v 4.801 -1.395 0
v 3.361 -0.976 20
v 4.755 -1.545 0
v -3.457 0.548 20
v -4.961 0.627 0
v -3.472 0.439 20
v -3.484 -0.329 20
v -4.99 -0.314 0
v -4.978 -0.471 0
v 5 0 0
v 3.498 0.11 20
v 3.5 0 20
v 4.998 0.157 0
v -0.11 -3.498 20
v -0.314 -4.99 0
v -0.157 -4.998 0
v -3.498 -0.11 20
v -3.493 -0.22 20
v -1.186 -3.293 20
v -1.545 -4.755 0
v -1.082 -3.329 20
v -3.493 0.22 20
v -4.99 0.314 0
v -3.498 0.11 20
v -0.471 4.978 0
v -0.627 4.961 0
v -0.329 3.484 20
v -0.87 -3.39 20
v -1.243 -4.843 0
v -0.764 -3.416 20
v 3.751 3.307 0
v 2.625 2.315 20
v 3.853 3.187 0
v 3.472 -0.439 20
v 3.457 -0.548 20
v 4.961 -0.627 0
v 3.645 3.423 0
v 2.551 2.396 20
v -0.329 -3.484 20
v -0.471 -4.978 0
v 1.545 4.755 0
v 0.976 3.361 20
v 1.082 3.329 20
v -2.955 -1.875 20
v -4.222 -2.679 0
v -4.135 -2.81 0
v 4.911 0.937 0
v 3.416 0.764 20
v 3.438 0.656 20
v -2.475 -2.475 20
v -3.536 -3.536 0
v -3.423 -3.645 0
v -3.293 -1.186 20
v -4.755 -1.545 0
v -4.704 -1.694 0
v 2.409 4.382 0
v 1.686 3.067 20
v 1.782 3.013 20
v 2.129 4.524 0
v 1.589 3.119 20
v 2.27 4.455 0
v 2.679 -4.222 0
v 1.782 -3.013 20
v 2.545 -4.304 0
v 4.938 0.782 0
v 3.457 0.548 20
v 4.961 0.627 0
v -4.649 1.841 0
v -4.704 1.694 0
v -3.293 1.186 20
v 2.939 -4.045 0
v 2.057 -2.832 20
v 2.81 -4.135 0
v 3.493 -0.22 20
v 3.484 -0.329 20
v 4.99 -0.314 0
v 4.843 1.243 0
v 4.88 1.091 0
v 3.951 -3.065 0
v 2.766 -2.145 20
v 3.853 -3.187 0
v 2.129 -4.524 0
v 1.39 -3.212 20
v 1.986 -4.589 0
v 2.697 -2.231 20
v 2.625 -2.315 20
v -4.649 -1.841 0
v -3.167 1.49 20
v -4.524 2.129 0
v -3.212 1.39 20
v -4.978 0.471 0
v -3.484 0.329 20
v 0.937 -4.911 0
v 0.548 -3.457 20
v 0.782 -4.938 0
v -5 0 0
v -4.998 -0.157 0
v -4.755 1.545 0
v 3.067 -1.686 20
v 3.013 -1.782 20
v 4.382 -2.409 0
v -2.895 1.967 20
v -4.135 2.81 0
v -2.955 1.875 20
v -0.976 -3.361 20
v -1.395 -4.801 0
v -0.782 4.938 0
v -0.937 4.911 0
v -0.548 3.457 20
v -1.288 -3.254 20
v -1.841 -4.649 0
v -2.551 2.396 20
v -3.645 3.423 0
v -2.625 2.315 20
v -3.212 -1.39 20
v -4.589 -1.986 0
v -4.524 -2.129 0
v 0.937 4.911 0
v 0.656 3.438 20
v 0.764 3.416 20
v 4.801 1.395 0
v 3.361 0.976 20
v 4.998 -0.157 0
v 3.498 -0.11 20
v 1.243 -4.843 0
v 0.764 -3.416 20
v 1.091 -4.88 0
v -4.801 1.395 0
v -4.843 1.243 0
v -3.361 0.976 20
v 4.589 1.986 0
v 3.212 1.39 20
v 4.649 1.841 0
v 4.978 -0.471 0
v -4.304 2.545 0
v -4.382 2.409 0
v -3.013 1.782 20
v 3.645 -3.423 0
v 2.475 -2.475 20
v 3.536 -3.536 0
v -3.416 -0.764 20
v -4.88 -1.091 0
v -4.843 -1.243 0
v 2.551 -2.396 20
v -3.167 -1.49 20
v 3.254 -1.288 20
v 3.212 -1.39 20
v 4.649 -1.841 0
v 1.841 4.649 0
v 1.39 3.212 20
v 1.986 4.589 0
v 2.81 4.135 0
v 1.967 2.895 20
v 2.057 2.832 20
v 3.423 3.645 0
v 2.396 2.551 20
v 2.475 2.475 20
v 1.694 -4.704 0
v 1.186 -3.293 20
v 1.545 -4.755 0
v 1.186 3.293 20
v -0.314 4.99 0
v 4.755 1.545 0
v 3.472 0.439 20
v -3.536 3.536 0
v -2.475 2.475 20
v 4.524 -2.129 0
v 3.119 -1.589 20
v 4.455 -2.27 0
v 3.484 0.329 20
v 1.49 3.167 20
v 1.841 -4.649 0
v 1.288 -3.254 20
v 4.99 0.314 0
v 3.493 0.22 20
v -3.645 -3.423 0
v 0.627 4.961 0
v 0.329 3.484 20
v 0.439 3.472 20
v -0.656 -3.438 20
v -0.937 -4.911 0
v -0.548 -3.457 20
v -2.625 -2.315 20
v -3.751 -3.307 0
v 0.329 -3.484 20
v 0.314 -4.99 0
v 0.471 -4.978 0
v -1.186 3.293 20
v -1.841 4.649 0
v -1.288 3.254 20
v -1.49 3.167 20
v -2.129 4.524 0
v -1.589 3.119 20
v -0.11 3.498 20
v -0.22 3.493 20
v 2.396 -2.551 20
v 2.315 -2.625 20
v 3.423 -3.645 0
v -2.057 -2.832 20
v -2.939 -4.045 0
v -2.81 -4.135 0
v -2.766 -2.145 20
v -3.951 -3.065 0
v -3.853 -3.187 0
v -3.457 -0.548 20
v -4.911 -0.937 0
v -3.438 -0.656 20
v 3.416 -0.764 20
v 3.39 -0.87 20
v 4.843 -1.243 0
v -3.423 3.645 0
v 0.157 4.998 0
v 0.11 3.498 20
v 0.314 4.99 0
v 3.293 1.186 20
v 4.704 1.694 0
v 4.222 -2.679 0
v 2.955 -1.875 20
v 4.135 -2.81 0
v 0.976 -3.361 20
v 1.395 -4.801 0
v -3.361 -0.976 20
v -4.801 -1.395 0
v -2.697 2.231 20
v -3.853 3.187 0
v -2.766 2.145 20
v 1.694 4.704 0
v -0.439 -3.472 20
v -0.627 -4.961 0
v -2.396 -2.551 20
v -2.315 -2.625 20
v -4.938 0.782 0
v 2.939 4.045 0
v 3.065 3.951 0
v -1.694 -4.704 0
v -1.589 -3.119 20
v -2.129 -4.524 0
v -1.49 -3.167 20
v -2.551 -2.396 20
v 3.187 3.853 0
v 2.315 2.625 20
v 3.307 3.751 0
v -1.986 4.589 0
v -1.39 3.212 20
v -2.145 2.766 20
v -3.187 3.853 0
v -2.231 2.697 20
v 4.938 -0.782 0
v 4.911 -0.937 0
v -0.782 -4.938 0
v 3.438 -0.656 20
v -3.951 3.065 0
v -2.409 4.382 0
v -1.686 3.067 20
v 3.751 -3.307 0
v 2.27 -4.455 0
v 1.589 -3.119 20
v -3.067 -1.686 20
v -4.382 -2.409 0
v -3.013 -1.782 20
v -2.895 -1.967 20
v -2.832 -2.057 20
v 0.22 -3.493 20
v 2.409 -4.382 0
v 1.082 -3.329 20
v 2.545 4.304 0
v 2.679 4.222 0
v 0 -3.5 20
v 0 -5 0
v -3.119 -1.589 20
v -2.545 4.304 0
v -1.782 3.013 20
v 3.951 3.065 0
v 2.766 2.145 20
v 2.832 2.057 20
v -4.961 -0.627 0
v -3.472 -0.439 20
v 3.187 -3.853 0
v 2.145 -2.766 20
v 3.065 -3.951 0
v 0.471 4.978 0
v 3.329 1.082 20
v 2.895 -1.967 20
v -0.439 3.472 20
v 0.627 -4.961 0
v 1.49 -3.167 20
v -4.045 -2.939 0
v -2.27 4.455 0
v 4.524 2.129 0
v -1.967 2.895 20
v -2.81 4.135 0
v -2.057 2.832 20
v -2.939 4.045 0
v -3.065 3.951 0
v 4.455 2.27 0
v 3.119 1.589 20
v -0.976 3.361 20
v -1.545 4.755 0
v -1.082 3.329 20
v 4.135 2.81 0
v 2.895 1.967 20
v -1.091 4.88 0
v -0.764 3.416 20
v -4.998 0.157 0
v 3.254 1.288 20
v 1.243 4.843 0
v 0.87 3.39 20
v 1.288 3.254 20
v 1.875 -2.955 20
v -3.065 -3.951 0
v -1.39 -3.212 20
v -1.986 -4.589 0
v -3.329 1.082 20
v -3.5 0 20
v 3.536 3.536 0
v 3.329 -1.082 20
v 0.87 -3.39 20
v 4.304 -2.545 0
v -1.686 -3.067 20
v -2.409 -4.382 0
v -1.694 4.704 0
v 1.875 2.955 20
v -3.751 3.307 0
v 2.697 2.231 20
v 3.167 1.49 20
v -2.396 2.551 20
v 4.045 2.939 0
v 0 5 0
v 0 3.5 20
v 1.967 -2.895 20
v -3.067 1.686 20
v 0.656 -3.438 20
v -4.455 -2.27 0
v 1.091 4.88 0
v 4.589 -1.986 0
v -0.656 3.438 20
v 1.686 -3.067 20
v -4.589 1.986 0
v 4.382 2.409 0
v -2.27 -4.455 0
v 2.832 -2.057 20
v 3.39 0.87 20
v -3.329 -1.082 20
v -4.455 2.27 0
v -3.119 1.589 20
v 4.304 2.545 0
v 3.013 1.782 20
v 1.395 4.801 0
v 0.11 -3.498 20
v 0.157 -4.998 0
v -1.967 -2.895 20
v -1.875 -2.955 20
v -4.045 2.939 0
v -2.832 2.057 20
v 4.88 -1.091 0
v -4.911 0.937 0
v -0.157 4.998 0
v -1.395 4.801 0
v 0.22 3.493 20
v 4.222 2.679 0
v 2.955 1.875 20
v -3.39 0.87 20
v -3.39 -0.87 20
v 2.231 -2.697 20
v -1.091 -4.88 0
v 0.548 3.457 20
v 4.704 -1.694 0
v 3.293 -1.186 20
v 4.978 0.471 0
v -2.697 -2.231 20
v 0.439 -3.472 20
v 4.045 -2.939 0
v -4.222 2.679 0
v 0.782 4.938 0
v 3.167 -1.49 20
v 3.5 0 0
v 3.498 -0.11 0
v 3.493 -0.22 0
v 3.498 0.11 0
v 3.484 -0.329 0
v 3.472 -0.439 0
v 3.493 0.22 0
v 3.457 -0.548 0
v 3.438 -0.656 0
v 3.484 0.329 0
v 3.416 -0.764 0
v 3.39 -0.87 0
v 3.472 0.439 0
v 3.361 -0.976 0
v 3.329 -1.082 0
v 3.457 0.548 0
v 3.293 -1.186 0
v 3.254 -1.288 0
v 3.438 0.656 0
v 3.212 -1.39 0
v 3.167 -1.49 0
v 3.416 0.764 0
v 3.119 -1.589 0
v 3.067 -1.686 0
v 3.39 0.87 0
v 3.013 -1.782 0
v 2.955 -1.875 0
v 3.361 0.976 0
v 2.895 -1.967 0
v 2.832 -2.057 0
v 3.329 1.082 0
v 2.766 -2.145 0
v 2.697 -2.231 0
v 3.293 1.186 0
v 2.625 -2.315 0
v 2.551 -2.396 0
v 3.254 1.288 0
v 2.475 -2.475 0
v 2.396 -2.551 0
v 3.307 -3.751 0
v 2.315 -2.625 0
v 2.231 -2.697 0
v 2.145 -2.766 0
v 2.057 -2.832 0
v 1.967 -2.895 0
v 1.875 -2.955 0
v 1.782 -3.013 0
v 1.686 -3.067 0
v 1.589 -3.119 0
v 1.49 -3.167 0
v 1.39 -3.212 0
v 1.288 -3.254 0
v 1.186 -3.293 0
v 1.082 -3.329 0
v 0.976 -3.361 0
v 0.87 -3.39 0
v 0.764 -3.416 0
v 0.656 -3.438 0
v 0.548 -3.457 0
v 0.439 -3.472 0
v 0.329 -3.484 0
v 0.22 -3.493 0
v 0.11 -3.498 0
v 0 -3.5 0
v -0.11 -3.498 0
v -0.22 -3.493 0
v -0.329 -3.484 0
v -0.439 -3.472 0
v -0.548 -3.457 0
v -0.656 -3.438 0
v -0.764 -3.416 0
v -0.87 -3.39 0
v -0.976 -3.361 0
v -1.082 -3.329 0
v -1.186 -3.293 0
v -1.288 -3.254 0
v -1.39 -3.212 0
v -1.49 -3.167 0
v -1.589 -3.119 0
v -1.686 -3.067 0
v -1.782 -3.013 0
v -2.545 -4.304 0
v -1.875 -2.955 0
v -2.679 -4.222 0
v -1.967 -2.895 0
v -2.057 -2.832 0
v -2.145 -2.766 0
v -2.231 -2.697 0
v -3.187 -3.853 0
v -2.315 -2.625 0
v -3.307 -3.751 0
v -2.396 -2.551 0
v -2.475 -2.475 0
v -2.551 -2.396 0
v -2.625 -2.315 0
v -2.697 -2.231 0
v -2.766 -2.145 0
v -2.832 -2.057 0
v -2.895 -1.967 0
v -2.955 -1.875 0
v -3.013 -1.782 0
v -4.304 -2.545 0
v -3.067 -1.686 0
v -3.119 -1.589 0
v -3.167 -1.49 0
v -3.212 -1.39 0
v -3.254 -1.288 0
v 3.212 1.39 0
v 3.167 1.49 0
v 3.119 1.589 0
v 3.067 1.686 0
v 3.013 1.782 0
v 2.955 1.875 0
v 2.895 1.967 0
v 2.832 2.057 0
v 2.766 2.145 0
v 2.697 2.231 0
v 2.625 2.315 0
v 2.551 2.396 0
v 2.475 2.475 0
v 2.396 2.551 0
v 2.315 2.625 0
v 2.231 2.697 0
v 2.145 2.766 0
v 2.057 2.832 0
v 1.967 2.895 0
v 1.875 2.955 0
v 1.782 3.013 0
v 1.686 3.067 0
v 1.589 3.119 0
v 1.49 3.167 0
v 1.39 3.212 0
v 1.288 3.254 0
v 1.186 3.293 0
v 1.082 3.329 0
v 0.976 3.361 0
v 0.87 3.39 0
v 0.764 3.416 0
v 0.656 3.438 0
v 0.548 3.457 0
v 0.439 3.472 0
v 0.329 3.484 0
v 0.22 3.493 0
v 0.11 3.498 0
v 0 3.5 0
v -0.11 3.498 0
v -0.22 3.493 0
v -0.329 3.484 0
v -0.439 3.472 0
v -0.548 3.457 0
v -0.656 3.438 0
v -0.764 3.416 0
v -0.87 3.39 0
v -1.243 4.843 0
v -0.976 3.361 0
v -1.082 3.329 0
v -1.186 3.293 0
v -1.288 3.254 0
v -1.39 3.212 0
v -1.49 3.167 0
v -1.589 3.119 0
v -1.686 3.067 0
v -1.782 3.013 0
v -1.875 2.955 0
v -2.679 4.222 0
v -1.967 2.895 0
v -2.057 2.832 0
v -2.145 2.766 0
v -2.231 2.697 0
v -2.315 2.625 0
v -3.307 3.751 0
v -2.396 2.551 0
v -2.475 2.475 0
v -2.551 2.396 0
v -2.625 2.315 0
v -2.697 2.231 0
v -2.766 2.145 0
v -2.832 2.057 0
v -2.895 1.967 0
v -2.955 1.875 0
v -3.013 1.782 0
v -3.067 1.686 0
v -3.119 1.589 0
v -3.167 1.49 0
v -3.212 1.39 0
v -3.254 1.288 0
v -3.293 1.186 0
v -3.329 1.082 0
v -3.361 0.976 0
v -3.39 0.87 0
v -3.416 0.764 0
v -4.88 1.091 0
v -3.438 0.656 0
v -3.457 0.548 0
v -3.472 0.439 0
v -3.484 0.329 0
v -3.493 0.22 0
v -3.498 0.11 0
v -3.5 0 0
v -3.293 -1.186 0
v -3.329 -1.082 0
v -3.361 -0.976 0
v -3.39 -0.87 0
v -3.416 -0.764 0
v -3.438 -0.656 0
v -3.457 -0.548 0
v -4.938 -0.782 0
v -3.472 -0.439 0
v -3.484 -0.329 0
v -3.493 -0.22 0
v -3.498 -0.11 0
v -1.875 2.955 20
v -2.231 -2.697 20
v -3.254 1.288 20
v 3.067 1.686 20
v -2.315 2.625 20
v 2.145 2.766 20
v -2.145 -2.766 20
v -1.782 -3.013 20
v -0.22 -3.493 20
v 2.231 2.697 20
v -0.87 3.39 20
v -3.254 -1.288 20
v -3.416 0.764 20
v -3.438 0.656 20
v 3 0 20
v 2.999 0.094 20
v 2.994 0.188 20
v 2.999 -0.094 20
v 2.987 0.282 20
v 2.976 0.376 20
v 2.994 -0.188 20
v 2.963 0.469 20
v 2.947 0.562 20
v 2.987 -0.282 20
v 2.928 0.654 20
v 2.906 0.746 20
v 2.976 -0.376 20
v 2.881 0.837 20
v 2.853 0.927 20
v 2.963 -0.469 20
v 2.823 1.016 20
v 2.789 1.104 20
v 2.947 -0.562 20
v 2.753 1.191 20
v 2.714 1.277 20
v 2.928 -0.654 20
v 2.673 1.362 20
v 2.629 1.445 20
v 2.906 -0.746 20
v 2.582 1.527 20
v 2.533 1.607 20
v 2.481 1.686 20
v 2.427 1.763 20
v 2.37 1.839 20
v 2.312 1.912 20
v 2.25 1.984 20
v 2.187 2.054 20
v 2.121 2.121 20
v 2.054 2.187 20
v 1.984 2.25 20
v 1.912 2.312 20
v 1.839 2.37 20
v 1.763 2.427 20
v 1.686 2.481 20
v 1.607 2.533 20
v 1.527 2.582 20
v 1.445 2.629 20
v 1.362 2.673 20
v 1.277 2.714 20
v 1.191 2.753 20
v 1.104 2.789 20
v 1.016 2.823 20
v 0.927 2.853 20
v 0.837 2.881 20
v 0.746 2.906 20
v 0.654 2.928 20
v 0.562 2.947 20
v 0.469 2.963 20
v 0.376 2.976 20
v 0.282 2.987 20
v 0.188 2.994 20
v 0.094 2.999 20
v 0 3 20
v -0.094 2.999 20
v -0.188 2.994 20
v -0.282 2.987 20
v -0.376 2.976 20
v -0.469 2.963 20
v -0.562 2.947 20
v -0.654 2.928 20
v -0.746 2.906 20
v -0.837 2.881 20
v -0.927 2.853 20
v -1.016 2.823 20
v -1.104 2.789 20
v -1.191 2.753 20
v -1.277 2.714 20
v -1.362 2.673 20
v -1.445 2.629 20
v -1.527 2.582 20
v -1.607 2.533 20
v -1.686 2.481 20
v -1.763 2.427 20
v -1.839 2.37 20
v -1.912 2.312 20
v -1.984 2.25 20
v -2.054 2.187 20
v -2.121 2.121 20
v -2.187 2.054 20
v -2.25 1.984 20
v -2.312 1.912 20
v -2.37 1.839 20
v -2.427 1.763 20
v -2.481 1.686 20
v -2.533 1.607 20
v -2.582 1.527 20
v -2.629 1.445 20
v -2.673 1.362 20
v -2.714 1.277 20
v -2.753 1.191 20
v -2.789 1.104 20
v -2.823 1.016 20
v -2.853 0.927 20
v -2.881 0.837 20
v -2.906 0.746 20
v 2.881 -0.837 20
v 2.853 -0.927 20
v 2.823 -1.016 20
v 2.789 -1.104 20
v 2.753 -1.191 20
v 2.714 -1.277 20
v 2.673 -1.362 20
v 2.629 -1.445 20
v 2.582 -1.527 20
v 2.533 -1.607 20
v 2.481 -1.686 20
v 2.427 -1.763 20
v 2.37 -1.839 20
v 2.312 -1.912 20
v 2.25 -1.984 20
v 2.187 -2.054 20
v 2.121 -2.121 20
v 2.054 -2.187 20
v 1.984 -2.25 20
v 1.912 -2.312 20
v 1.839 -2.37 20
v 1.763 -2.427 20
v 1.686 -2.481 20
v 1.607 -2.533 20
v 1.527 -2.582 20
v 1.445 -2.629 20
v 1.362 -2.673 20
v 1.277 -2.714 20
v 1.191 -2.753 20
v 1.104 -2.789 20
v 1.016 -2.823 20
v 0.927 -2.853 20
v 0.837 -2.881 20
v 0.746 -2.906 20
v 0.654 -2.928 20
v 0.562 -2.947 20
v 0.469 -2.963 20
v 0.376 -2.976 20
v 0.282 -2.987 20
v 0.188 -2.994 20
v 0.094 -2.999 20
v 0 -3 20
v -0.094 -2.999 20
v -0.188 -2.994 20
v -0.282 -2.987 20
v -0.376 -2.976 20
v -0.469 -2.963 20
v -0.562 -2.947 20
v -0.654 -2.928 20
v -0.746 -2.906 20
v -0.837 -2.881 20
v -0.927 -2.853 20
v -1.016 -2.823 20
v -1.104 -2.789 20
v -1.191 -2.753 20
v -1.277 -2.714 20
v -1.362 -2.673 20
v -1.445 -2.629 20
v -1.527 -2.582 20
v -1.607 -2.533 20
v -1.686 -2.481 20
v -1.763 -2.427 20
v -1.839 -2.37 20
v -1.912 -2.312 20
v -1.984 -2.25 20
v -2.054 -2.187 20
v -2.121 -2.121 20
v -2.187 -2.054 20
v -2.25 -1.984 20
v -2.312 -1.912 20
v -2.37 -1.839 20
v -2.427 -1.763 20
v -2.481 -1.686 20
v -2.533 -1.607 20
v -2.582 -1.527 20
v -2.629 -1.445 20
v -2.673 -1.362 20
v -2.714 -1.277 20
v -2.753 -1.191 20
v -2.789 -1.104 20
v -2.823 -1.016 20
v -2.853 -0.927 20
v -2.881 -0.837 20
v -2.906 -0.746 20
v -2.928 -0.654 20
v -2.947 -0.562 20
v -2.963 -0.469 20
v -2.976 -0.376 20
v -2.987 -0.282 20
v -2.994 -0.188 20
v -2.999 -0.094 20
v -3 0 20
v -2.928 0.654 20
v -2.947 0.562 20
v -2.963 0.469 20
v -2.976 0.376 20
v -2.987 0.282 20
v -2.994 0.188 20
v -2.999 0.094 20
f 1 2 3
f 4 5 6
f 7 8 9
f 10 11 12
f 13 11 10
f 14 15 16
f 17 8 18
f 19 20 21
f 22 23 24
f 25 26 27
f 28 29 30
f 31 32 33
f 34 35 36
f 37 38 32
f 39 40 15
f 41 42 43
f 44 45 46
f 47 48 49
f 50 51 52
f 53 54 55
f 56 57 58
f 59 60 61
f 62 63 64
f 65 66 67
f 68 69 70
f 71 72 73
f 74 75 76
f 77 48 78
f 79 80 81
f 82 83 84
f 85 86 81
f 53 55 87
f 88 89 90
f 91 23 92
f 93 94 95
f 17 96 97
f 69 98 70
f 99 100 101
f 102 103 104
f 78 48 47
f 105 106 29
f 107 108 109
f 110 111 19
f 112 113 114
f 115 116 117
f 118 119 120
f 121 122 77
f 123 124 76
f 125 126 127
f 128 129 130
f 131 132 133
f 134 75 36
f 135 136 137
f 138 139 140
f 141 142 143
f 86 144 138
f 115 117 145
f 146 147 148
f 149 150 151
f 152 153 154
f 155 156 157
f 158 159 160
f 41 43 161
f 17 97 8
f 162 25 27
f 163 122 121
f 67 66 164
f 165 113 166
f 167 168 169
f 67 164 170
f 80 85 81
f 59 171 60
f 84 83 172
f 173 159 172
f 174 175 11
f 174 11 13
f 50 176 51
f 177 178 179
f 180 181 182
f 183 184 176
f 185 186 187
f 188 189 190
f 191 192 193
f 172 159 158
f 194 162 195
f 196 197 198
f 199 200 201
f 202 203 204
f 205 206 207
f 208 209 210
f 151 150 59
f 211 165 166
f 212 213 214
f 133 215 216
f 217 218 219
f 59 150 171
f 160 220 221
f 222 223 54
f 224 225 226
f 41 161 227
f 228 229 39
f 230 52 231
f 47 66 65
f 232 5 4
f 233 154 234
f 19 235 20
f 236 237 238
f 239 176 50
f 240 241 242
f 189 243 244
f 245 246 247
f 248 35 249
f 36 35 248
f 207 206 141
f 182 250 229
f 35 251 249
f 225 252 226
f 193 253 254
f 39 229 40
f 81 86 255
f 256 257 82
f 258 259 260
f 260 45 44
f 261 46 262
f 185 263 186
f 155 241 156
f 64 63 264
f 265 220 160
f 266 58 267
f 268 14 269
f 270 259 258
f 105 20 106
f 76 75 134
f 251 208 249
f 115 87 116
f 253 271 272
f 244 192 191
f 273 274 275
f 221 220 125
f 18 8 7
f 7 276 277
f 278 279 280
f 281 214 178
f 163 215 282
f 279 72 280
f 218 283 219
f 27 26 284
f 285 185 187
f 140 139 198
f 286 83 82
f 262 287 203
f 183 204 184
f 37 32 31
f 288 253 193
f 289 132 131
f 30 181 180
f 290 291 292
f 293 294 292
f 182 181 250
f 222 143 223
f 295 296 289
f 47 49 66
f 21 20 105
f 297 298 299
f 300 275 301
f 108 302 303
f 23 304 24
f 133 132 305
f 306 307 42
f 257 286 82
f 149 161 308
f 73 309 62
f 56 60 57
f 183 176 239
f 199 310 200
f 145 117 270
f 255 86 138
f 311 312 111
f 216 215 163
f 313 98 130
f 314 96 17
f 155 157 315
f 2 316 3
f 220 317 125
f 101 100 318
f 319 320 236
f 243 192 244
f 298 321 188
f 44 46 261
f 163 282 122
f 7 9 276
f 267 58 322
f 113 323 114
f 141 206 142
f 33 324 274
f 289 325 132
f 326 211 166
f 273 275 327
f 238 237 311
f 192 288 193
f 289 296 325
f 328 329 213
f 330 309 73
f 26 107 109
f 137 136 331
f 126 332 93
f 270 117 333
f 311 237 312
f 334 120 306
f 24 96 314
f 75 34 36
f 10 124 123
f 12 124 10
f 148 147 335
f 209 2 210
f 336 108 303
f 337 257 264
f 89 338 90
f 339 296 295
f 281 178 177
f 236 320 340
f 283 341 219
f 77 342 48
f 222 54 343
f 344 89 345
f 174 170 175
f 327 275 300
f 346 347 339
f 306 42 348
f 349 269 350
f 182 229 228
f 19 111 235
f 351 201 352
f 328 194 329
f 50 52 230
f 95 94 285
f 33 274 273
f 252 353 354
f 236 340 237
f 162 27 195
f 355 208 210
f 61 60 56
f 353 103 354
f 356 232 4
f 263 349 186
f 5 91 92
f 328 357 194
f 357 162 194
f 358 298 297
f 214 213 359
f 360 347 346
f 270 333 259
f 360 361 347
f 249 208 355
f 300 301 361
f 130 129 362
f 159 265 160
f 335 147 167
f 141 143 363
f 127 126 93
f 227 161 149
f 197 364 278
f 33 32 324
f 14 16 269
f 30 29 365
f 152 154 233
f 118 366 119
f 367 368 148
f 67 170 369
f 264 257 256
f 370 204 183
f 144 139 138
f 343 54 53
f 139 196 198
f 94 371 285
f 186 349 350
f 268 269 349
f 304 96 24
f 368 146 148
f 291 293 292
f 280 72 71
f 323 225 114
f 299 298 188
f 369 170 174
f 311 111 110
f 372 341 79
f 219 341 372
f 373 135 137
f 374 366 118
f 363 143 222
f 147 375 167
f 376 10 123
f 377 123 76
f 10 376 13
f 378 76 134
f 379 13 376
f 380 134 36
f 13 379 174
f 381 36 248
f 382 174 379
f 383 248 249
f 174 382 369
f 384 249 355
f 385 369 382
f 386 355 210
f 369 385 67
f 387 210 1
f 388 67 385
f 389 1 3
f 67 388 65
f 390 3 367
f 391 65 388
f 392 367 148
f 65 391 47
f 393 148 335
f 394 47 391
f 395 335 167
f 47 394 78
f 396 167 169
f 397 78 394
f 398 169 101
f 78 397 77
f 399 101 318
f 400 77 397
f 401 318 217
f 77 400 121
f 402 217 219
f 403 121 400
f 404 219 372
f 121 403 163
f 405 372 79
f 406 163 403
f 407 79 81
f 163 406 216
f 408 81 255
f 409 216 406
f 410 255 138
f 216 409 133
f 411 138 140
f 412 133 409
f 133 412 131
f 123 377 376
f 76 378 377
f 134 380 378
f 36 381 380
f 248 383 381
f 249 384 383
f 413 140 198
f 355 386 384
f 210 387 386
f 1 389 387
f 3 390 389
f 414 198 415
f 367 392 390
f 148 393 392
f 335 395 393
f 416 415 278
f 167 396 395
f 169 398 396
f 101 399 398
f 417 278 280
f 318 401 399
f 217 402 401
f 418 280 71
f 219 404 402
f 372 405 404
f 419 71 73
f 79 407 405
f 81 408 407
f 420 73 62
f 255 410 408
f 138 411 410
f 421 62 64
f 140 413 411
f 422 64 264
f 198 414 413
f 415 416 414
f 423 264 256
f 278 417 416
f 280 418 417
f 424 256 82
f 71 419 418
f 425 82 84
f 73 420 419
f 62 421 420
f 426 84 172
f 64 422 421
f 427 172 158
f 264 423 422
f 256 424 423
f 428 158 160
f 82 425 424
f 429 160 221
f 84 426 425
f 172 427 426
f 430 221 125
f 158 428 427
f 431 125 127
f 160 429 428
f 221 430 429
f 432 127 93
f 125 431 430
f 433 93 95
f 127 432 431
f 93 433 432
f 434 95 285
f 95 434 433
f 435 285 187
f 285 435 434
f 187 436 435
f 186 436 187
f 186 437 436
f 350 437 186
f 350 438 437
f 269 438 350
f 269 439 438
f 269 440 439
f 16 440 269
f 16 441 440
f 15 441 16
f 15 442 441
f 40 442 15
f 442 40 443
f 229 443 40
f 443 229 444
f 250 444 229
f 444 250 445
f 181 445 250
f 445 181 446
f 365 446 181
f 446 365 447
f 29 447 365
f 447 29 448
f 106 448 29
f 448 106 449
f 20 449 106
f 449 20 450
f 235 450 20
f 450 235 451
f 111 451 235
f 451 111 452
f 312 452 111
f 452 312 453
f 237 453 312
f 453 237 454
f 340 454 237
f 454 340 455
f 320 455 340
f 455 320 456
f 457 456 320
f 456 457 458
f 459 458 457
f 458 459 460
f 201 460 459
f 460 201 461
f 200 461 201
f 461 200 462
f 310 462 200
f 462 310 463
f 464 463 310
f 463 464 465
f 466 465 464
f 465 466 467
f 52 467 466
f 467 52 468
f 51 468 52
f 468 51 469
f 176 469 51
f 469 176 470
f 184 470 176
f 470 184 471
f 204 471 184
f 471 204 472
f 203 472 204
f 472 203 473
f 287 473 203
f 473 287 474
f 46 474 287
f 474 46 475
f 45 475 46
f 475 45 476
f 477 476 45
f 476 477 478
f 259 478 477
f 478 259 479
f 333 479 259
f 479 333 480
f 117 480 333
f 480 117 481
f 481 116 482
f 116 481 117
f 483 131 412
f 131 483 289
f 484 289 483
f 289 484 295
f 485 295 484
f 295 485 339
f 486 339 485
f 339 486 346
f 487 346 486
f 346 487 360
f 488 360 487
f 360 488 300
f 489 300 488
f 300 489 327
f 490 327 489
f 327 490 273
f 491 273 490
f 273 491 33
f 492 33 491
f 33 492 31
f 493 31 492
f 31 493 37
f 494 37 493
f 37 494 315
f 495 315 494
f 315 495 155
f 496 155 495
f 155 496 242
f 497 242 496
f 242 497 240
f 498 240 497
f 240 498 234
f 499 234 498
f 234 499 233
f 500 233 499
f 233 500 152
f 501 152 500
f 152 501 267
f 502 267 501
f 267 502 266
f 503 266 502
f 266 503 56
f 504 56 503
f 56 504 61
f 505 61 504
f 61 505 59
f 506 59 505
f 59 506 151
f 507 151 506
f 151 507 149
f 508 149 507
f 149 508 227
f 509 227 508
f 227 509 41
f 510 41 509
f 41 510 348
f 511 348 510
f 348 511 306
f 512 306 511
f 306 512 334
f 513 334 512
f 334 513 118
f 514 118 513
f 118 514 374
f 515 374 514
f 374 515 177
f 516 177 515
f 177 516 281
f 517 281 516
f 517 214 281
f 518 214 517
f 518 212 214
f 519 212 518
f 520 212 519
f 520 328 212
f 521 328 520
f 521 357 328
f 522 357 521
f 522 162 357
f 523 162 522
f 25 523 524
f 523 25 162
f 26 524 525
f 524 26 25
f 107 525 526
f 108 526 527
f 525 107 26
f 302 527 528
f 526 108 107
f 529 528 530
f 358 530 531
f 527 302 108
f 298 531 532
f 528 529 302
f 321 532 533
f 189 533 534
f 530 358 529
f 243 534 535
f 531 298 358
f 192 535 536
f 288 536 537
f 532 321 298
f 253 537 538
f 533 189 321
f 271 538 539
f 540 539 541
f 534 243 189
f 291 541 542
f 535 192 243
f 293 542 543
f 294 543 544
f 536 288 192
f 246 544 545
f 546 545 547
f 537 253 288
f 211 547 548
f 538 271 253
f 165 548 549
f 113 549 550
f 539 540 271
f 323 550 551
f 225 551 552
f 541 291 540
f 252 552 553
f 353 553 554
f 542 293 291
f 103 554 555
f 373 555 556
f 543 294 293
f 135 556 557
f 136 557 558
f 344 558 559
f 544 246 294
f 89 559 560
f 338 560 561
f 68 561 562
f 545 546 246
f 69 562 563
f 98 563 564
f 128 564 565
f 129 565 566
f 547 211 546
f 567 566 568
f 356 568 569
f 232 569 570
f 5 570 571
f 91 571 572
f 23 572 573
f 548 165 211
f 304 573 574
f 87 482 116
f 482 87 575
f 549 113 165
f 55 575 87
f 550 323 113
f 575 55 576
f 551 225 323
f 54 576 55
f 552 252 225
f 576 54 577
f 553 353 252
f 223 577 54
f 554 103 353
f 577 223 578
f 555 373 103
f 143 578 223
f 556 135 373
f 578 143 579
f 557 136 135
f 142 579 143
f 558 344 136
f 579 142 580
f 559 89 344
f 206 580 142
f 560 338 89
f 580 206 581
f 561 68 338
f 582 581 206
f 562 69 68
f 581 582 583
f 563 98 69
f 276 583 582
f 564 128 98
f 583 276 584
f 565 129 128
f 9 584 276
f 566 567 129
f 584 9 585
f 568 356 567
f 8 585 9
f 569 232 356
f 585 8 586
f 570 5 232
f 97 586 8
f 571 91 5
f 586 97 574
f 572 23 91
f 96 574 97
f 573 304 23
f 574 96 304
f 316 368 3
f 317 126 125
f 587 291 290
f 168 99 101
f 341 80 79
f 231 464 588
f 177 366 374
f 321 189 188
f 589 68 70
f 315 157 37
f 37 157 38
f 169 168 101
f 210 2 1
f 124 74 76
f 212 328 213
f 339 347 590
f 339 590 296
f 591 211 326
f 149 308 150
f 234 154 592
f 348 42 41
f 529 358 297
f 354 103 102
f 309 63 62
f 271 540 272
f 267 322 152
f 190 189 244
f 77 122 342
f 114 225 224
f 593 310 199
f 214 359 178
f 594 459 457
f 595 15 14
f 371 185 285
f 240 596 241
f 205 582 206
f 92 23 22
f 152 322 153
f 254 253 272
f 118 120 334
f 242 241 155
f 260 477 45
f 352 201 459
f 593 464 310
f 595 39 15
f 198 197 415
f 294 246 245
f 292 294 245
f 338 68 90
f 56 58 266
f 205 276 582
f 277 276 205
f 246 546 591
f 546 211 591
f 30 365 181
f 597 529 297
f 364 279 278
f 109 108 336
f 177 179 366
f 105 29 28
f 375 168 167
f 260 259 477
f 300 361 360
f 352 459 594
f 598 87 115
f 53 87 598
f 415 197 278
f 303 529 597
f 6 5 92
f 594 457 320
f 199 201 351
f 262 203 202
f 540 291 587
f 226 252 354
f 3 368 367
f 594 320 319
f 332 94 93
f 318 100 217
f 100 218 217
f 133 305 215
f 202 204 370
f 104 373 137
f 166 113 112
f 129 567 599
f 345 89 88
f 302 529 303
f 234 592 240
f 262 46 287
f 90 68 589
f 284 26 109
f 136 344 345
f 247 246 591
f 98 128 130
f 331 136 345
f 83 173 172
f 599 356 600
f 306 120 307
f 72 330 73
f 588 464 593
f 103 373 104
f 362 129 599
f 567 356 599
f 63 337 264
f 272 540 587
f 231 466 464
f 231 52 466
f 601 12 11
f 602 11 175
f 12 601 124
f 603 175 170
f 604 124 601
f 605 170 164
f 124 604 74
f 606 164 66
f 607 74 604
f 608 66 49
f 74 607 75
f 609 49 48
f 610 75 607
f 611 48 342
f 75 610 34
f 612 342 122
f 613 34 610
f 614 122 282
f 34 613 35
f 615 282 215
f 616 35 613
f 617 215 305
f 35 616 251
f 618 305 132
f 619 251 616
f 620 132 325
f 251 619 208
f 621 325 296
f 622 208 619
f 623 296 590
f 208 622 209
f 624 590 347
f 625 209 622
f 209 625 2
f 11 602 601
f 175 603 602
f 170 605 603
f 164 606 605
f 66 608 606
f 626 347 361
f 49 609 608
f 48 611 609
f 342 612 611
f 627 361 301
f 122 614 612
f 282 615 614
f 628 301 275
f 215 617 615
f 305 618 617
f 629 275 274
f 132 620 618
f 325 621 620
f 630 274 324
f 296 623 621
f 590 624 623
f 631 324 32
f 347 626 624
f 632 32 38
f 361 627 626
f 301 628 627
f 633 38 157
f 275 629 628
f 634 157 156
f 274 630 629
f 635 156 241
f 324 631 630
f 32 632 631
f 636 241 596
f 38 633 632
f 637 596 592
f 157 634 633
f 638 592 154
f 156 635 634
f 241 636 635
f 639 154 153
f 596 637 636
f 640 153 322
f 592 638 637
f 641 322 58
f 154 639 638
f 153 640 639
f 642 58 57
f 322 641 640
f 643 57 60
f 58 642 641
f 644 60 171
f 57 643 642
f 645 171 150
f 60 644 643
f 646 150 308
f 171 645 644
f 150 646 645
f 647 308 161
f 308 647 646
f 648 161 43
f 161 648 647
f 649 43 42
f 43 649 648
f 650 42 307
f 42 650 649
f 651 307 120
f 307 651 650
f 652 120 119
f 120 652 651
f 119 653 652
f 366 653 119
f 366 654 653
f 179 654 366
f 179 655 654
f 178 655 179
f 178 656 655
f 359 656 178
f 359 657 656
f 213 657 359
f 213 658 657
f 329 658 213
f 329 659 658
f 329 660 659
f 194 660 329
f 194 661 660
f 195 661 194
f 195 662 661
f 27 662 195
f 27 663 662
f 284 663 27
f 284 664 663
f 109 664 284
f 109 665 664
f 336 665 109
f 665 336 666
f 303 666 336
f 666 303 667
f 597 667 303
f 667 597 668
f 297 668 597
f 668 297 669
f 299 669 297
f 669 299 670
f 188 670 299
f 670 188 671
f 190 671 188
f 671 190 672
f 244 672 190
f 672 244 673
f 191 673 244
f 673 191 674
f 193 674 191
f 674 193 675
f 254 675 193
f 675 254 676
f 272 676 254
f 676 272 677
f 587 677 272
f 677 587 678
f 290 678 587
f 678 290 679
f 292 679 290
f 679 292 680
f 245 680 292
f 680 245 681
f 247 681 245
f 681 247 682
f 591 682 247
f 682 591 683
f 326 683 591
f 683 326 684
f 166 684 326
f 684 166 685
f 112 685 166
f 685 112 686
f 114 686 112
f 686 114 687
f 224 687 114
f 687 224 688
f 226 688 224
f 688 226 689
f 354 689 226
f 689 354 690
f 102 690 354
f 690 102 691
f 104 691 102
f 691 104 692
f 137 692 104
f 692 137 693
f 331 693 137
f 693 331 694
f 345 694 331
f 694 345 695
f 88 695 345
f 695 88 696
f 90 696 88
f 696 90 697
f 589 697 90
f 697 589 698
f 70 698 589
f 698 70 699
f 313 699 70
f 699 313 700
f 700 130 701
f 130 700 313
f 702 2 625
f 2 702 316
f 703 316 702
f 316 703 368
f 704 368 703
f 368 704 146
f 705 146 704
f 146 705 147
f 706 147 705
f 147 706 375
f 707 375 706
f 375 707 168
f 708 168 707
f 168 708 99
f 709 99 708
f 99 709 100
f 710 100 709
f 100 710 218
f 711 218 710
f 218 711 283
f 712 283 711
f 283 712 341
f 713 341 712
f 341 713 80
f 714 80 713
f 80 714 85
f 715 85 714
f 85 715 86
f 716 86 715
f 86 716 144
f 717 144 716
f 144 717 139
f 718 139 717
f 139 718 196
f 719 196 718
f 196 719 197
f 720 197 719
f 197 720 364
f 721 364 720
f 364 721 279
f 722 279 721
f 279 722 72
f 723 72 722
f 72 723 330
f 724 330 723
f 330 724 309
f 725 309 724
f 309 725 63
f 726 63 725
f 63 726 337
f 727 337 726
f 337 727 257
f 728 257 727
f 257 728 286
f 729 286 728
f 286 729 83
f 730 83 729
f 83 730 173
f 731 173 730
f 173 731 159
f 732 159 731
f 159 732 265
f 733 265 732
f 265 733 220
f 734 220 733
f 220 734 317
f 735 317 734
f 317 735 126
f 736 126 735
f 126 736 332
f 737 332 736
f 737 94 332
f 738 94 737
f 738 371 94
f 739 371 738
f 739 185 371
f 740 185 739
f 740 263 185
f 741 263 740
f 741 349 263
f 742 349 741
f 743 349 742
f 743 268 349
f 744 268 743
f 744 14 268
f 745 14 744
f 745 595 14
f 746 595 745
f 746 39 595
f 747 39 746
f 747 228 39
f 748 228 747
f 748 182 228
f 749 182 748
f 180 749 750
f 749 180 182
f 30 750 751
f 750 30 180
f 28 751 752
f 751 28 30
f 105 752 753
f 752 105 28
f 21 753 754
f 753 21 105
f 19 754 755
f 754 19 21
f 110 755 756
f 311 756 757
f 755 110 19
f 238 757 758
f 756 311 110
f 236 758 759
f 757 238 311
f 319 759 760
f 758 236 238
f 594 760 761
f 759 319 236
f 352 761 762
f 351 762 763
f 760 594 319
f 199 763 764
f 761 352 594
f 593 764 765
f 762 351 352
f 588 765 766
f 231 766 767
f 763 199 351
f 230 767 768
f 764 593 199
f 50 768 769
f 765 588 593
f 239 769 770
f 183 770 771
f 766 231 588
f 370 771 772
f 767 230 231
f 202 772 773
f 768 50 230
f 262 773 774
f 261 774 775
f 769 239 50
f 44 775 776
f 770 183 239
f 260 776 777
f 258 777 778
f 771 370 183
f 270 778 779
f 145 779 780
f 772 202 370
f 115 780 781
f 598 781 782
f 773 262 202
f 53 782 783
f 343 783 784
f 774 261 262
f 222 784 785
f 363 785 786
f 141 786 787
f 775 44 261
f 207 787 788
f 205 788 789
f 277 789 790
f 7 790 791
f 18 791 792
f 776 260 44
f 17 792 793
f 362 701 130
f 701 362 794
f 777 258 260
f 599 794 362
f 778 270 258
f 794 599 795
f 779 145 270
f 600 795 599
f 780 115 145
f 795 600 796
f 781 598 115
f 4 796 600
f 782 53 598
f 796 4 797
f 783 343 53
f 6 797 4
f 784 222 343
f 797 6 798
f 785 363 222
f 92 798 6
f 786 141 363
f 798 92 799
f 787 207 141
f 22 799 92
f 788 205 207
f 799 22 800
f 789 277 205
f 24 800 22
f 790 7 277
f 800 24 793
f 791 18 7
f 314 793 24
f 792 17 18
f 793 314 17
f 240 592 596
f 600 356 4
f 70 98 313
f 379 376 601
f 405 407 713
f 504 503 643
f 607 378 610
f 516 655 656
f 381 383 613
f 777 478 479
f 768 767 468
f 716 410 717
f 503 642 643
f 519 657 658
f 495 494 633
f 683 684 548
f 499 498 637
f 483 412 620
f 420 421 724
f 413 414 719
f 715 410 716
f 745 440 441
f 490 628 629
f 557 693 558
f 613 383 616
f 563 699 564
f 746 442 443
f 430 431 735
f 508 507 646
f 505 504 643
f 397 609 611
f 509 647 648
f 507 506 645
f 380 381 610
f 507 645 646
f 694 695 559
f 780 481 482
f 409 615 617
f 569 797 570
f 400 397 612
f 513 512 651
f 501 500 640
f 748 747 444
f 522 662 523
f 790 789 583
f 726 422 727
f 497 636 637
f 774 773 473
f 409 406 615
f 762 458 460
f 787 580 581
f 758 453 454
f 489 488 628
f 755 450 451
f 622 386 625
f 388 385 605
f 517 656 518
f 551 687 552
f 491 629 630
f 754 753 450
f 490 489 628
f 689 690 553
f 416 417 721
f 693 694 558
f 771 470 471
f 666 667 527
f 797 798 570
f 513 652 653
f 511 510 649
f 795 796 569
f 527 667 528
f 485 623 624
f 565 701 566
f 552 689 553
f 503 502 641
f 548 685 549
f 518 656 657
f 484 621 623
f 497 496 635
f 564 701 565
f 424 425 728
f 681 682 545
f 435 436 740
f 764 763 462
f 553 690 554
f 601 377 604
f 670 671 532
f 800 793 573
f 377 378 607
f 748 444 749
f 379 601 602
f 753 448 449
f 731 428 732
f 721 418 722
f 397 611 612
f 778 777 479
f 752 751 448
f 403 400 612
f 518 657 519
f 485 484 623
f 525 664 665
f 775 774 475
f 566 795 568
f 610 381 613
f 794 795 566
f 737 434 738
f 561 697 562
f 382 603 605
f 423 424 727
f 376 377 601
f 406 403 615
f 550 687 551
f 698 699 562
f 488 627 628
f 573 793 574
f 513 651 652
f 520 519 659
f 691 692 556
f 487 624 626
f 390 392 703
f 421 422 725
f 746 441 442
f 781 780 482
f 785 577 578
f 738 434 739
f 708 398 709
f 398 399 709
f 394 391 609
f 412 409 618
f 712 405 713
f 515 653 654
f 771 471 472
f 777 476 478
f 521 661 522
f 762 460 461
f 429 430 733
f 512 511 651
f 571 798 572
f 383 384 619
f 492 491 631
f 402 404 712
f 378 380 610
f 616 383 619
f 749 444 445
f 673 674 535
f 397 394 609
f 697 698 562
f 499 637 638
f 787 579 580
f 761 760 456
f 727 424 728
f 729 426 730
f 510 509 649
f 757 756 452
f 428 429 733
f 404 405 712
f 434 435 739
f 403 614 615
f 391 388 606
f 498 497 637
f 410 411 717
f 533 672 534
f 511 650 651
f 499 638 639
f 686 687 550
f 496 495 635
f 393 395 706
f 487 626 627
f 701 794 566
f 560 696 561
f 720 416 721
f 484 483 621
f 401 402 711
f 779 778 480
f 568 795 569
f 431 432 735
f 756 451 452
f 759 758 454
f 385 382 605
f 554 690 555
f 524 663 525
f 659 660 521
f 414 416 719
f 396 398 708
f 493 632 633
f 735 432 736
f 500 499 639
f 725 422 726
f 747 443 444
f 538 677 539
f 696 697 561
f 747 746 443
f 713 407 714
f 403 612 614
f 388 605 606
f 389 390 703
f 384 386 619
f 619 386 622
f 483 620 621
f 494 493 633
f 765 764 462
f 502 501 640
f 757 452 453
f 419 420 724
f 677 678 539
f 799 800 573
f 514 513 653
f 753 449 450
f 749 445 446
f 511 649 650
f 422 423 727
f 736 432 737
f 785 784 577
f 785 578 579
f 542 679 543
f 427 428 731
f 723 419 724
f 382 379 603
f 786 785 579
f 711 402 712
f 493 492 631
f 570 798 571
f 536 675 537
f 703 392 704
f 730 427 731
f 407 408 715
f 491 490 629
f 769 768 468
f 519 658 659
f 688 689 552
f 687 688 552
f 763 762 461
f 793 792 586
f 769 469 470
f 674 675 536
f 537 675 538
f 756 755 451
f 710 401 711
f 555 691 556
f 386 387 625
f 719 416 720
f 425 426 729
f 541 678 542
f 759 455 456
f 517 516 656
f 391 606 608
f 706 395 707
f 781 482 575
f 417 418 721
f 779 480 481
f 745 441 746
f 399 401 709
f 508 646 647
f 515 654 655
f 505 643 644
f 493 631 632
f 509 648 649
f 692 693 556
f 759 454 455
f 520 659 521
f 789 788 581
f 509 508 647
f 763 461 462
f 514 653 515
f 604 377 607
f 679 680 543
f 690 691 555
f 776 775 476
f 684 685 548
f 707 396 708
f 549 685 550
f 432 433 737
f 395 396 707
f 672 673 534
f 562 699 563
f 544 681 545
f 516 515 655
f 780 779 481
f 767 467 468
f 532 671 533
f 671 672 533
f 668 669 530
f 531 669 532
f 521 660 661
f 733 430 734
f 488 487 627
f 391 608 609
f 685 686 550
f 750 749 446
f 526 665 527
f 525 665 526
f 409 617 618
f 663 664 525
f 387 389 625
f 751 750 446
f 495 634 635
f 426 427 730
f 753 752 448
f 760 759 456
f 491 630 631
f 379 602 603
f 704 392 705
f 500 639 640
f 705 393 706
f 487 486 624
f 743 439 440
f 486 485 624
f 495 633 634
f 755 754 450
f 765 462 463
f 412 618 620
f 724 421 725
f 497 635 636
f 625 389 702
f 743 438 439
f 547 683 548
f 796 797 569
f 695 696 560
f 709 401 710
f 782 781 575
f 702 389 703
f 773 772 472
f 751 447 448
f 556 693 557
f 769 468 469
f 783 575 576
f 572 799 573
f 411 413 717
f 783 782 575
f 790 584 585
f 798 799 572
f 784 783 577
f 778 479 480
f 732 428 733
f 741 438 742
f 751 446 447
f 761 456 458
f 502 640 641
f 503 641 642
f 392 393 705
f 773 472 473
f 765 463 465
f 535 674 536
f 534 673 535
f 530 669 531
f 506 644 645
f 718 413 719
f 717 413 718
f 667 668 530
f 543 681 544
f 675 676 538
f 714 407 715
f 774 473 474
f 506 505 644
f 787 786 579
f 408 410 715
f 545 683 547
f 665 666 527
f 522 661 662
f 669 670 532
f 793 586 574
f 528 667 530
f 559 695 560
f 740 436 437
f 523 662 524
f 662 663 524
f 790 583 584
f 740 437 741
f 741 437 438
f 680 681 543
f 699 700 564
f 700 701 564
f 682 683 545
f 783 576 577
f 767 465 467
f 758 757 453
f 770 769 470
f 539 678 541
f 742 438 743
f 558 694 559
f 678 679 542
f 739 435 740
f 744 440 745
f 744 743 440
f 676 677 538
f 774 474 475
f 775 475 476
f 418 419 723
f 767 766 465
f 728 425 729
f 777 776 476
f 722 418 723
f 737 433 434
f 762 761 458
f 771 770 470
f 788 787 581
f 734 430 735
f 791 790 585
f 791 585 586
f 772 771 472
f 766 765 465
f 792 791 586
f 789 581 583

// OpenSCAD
HEIGHT = 20;

ID_TOP = 6;
OD_TOP = 7;

ID_BOT = OD_TOP;
OD_BOT = 10;

$fn = 200;

difference() {
  cylinder(d1 = OD_BOT, d2 = OD_TOP, h = HEIGHT);
  cylinder(d1 = ID_BOT, d2 = ID_TOP, h = HEIGHT);
}
